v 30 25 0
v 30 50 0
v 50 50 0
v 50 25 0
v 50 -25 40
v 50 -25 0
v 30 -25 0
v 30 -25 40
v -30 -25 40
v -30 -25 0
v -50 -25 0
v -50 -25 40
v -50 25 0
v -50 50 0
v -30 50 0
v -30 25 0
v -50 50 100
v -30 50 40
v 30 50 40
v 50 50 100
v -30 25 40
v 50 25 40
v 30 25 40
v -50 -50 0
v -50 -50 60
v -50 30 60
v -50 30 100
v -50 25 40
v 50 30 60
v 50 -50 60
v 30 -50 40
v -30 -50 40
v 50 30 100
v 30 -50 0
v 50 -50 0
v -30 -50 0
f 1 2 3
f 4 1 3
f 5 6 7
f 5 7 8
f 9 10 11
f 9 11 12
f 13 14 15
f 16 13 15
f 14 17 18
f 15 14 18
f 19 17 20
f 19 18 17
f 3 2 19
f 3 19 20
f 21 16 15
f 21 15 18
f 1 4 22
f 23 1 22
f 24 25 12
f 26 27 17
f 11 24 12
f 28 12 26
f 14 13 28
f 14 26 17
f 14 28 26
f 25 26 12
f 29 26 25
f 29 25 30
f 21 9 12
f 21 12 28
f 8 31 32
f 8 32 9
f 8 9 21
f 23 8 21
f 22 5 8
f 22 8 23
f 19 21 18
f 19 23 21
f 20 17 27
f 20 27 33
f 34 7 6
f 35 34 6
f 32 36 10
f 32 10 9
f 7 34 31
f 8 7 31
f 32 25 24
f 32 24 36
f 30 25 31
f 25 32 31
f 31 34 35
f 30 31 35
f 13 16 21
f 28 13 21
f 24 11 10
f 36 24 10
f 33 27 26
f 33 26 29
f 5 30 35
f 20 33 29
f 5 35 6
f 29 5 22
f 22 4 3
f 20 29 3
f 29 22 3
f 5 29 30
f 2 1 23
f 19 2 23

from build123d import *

# Parameters (mm, degrees)
F0_W     = 100
F0_H     = 100
F1_DEPTH = 100
F2_W     = 100
F2_H     = 80
F3_DEPTH = 40
F4_W     = 60
F4_H     = 40
F5_DEPTH = 100.001
F6_W     = 50
F6_H     = 40
F7_DEPTH = 100.001


with BuildPart() as f1:
    # F0 (on Top) → F1 (new body)
    with BuildSketch(Plane.XY):
        Rectangle(F0_W, F0_H)
    extrude(amount=F1_DEPTH)

    # F2 (on face) → F3 (cut)
    with BuildSketch(Plane.XY.offset(100)):
        with Locations((0, -10)):
            Rectangle(F2_W, F2_H)
    extrude(amount=-F3_DEPTH, mode=Mode.SUBTRACT)

    # F4 (on face) → F5 (cut, through all)
    with BuildSketch(Plane.XZ.offset(50)):
        with Locations((0, 20)):
            Rectangle(F4_W, F4_H)
    extrude(amount=-F5_DEPTH, mode=Mode.SUBTRACT)

    # F6 (on face) → F7 (cut, through all)
    with BuildSketch(Plane.YZ.offset(50)):
        with Locations((0, 20)):
            Rectangle(F6_W, F6_H)
    extrude(amount=-F7_DEPTH, mode=Mode.SUBTRACT)


solid = f1.part
